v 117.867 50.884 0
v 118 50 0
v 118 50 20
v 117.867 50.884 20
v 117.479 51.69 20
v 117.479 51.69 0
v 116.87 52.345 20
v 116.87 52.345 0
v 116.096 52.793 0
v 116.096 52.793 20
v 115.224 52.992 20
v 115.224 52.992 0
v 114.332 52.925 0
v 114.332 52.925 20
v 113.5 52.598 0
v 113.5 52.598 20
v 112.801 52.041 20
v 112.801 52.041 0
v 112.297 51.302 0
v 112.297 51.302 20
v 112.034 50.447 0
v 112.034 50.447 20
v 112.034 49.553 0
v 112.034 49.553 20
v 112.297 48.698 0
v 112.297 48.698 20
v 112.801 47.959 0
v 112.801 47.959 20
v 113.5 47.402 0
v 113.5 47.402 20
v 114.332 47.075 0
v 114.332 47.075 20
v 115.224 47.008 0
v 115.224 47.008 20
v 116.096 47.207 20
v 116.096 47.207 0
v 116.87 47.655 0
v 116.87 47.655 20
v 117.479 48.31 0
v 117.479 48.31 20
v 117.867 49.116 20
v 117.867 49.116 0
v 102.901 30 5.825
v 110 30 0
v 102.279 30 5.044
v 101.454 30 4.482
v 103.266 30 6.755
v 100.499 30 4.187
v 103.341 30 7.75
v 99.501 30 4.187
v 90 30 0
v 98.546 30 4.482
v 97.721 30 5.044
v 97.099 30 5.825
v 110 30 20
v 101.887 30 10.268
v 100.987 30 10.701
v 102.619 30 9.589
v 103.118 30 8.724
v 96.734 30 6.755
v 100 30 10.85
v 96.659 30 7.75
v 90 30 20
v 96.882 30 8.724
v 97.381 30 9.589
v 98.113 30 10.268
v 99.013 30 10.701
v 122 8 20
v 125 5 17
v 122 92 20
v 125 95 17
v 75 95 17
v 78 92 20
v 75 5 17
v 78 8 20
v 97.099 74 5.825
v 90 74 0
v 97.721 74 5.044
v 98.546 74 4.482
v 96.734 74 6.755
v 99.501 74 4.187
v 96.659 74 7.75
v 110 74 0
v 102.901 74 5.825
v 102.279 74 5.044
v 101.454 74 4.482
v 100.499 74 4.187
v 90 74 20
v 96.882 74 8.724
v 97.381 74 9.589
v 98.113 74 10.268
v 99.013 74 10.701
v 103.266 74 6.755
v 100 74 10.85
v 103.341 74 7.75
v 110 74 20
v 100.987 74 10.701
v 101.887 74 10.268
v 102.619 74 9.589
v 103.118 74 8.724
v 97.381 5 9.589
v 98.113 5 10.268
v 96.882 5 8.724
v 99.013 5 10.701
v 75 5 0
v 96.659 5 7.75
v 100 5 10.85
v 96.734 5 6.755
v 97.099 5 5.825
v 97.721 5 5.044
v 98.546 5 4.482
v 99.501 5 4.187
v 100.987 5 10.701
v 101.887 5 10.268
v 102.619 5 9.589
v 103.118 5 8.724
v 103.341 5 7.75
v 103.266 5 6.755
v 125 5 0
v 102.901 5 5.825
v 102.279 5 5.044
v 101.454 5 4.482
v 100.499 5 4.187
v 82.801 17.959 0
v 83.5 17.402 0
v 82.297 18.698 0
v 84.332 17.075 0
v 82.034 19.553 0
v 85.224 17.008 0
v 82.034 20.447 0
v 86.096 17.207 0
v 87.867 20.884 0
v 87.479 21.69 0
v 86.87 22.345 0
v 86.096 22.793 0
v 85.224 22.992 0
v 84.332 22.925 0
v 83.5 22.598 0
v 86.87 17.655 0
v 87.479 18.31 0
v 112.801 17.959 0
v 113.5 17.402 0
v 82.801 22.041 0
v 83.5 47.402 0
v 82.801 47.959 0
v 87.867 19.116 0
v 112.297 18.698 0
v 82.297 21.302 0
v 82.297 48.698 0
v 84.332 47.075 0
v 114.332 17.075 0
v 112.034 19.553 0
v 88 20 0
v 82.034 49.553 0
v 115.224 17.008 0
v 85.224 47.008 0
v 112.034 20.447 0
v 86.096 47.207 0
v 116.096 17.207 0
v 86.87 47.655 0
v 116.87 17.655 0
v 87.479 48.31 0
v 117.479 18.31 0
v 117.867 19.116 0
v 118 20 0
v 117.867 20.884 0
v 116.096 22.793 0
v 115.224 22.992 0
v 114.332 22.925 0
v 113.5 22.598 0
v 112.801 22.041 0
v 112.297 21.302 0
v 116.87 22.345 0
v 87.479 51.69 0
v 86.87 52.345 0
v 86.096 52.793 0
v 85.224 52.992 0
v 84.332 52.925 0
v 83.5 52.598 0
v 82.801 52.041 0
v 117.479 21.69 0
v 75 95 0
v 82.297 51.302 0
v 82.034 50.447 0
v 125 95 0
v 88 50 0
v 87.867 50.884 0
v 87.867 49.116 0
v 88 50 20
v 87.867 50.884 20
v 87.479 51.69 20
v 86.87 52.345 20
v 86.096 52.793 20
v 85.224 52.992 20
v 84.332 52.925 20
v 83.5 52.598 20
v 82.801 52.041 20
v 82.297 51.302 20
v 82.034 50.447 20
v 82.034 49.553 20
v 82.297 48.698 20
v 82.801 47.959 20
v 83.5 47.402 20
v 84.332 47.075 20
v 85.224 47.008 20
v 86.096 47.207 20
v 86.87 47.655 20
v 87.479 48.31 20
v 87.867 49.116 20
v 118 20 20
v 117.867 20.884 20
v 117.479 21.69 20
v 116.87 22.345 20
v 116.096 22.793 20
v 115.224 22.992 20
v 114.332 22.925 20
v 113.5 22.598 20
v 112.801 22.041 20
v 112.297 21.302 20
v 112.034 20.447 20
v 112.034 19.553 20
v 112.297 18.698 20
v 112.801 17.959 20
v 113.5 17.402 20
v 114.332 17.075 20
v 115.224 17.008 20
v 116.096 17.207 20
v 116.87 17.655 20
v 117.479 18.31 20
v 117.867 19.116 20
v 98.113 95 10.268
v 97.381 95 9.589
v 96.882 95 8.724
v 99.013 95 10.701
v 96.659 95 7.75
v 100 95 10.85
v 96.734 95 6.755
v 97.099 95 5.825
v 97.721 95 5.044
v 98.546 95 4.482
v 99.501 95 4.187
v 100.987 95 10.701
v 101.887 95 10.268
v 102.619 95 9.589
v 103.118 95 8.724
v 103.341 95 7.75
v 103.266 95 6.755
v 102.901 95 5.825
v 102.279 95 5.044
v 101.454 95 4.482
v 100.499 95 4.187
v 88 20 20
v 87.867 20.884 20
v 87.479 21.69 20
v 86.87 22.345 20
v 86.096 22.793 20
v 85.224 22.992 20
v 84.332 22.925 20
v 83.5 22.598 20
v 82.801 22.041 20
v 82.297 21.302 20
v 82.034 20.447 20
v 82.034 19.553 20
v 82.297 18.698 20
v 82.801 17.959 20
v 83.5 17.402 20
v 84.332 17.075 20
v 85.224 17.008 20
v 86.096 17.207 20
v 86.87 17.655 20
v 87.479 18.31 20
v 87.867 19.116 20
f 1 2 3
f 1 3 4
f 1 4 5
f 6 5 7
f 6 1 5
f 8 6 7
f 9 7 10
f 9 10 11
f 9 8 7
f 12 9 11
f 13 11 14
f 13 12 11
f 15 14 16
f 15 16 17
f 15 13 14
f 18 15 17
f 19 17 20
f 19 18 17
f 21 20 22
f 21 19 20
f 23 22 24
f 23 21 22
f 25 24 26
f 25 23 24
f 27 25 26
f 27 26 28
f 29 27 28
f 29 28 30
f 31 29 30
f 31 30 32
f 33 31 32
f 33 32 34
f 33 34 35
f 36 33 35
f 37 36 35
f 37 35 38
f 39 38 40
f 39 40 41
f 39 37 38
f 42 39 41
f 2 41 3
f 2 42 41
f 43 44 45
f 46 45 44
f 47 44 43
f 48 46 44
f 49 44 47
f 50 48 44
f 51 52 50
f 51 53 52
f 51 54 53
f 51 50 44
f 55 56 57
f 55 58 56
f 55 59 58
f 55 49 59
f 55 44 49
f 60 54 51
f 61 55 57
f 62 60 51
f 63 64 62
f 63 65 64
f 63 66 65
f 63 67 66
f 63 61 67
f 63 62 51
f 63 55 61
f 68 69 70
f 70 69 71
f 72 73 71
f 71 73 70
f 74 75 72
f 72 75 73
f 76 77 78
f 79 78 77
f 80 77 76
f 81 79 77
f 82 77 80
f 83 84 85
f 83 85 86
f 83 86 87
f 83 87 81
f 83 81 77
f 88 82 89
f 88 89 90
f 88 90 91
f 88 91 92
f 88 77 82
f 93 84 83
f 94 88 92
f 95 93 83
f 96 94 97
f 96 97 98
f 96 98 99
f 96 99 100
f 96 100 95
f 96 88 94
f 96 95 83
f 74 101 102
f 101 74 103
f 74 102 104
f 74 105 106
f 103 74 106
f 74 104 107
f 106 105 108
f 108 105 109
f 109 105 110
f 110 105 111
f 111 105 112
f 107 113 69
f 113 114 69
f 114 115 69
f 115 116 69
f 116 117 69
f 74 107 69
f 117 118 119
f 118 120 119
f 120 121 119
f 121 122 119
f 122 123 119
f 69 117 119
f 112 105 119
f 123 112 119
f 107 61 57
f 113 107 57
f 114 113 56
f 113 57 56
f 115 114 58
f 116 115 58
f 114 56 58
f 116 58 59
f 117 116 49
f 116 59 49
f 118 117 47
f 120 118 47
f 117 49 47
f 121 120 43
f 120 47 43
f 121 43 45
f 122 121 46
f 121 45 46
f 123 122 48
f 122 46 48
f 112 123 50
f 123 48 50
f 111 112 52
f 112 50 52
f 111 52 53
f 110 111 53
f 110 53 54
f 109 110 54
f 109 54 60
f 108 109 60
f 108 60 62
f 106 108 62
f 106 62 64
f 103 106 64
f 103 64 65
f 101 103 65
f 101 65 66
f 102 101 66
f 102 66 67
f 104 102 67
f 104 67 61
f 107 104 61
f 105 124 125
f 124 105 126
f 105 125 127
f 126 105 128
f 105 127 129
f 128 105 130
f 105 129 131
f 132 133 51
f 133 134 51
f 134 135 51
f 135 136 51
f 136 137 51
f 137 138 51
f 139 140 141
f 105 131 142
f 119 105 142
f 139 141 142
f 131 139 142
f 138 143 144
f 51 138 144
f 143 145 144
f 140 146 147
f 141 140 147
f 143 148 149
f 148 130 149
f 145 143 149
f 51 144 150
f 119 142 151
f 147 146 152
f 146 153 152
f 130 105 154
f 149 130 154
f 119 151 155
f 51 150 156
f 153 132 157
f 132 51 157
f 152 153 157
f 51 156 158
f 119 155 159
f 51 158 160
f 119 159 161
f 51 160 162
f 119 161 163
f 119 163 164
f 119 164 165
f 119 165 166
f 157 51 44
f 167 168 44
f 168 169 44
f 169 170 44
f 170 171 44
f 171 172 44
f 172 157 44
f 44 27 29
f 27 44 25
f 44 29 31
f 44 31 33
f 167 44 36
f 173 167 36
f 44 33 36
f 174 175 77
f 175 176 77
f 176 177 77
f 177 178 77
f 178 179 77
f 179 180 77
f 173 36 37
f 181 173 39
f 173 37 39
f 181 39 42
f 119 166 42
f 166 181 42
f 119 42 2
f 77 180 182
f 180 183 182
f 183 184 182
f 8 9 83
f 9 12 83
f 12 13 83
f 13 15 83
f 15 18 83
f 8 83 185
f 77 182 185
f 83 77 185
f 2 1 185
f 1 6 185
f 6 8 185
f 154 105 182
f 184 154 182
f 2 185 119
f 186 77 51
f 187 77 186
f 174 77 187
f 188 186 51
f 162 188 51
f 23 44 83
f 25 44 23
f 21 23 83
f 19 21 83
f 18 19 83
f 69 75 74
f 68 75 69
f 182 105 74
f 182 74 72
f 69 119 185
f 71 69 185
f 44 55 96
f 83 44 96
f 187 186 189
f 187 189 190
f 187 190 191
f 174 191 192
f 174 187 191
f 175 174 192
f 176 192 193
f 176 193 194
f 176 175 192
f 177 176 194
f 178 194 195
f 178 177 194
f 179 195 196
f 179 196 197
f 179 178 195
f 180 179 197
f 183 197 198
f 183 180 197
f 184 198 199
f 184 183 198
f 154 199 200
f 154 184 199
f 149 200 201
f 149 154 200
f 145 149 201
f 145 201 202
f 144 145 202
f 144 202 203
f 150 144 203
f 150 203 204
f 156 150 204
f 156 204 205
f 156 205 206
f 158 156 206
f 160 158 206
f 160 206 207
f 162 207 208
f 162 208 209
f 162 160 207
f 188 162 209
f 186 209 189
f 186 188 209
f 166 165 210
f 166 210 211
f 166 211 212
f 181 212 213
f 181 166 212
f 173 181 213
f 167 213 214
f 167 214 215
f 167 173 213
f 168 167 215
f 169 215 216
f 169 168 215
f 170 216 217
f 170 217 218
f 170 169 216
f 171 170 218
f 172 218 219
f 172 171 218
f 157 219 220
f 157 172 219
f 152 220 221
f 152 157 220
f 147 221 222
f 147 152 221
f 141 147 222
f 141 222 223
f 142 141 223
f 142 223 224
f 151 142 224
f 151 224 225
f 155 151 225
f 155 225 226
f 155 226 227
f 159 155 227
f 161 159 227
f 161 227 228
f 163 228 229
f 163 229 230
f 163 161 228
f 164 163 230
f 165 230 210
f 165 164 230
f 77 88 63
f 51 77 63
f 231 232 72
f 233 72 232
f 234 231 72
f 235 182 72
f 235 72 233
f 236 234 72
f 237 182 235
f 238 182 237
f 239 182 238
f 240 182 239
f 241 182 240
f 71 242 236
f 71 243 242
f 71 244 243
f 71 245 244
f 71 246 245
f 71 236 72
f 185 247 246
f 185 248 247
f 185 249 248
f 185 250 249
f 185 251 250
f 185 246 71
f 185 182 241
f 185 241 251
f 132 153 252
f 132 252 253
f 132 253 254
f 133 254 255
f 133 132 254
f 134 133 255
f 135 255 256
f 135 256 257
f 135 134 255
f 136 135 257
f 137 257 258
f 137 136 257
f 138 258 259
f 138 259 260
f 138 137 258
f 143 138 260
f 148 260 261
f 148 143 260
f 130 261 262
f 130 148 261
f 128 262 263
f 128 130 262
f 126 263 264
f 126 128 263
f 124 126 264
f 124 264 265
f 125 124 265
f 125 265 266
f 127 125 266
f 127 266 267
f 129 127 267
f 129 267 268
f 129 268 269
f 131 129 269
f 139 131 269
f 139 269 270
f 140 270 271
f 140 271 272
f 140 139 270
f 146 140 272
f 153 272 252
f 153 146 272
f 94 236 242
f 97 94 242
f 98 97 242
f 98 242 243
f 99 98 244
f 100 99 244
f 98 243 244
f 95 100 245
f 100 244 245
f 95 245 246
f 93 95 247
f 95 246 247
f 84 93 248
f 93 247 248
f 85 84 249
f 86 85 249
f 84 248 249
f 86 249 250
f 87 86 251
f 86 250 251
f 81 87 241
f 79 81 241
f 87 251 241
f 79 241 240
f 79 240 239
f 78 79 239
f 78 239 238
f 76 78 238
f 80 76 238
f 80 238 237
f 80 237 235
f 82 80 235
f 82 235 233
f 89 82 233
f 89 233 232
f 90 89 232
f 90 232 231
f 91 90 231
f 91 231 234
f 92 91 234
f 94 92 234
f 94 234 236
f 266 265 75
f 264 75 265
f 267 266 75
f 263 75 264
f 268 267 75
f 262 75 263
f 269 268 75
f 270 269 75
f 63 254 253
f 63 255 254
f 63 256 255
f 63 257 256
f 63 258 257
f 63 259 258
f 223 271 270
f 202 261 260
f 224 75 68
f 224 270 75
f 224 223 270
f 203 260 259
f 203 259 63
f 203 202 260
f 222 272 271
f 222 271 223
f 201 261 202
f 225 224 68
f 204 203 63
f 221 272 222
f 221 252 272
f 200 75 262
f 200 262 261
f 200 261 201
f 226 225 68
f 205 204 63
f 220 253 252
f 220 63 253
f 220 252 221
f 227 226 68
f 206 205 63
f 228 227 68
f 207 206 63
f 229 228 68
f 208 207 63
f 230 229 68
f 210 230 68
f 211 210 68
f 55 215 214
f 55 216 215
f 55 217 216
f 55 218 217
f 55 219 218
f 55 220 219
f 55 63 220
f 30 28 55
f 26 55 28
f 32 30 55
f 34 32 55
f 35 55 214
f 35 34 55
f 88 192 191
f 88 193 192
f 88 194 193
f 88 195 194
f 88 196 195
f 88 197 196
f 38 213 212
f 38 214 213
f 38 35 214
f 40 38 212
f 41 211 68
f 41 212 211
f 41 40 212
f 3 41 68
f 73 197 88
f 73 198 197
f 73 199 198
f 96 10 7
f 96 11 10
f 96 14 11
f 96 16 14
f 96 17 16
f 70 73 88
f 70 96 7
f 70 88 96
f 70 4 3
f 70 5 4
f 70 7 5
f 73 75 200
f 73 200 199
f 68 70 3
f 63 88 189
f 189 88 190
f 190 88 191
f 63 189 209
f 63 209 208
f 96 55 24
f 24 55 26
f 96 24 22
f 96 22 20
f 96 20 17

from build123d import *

# Parameters (mm, degrees)
SKETCH1_W           = 50
SKETCH1_H           = 90
SKETCH1_R           = 3
BOSS_EXTRUDE1_DEPTH = 20
SKETCH2_R           = 3.35
CUT_EXTRUDE1_DEPTH  = 156.32224567
CUT_EXTRUDE2_DEPTH  = 159.271917913
CHAMFER1_SIZE       = 3


with BuildPart() as part:
    # Sketch1 → Boss-Extrude1 (new body)
    with BuildSketch(Plane.XY):
        with Locations((100, 50)):
            Rectangle(SKETCH1_W, SKETCH1_H)
        with Locations((115, 20)):
            Circle(SKETCH1_R, mode=Mode.SUBTRACT)
        with Locations((85, 20)):
            Circle(SKETCH1_R, mode=Mode.SUBTRACT)
        with Locations((85, 50)):
            Circle(SKETCH1_R, mode=Mode.SUBTRACT)
        with Locations((115, 50)):
            Circle(SKETCH1_R, mode=Mode.SUBTRACT)
    extrude(amount=BOSS_EXTRUDE1_DEPTH)

    # Sketch2 → Cut-Extrude1 (cut, through all)
    with BuildSketch(Plane(origin=(0, 95, 0), x_dir=(1, 0, 0), z_dir=(0, 1, 0))):
        with Locations(Location((100, -7.5, 0), (0, 0, 270))):
            Circle(SKETCH2_R)
    extrude(amount=-CUT_EXTRUDE1_DEPTH, mode=Mode.SUBTRACT)

    # Sketch3 → Cut-Extrude2 (cut, through all)
    with BuildSketch(Plane.XY.offset(20)):
        Polygon((90, 70), (90, 74), (110, 74), (110, 70), (110, 30), (90, 30), align=None)
    extrude(amount=-CUT_EXTRUDE2_DEPTH, mode=Mode.SUBTRACT)

    # Chamfer1
    chamfer1_edges = [part.edges().sort_by_distance(p)[0] for p in [
        (75, 50, 20),
        (100, 5, 20),
        (125, 50, 20),
        (100, 95, 20),
    ]]
    chamfer(chamfer1_edges, length=CHAMFER1_SIZE)


solid = part.part
